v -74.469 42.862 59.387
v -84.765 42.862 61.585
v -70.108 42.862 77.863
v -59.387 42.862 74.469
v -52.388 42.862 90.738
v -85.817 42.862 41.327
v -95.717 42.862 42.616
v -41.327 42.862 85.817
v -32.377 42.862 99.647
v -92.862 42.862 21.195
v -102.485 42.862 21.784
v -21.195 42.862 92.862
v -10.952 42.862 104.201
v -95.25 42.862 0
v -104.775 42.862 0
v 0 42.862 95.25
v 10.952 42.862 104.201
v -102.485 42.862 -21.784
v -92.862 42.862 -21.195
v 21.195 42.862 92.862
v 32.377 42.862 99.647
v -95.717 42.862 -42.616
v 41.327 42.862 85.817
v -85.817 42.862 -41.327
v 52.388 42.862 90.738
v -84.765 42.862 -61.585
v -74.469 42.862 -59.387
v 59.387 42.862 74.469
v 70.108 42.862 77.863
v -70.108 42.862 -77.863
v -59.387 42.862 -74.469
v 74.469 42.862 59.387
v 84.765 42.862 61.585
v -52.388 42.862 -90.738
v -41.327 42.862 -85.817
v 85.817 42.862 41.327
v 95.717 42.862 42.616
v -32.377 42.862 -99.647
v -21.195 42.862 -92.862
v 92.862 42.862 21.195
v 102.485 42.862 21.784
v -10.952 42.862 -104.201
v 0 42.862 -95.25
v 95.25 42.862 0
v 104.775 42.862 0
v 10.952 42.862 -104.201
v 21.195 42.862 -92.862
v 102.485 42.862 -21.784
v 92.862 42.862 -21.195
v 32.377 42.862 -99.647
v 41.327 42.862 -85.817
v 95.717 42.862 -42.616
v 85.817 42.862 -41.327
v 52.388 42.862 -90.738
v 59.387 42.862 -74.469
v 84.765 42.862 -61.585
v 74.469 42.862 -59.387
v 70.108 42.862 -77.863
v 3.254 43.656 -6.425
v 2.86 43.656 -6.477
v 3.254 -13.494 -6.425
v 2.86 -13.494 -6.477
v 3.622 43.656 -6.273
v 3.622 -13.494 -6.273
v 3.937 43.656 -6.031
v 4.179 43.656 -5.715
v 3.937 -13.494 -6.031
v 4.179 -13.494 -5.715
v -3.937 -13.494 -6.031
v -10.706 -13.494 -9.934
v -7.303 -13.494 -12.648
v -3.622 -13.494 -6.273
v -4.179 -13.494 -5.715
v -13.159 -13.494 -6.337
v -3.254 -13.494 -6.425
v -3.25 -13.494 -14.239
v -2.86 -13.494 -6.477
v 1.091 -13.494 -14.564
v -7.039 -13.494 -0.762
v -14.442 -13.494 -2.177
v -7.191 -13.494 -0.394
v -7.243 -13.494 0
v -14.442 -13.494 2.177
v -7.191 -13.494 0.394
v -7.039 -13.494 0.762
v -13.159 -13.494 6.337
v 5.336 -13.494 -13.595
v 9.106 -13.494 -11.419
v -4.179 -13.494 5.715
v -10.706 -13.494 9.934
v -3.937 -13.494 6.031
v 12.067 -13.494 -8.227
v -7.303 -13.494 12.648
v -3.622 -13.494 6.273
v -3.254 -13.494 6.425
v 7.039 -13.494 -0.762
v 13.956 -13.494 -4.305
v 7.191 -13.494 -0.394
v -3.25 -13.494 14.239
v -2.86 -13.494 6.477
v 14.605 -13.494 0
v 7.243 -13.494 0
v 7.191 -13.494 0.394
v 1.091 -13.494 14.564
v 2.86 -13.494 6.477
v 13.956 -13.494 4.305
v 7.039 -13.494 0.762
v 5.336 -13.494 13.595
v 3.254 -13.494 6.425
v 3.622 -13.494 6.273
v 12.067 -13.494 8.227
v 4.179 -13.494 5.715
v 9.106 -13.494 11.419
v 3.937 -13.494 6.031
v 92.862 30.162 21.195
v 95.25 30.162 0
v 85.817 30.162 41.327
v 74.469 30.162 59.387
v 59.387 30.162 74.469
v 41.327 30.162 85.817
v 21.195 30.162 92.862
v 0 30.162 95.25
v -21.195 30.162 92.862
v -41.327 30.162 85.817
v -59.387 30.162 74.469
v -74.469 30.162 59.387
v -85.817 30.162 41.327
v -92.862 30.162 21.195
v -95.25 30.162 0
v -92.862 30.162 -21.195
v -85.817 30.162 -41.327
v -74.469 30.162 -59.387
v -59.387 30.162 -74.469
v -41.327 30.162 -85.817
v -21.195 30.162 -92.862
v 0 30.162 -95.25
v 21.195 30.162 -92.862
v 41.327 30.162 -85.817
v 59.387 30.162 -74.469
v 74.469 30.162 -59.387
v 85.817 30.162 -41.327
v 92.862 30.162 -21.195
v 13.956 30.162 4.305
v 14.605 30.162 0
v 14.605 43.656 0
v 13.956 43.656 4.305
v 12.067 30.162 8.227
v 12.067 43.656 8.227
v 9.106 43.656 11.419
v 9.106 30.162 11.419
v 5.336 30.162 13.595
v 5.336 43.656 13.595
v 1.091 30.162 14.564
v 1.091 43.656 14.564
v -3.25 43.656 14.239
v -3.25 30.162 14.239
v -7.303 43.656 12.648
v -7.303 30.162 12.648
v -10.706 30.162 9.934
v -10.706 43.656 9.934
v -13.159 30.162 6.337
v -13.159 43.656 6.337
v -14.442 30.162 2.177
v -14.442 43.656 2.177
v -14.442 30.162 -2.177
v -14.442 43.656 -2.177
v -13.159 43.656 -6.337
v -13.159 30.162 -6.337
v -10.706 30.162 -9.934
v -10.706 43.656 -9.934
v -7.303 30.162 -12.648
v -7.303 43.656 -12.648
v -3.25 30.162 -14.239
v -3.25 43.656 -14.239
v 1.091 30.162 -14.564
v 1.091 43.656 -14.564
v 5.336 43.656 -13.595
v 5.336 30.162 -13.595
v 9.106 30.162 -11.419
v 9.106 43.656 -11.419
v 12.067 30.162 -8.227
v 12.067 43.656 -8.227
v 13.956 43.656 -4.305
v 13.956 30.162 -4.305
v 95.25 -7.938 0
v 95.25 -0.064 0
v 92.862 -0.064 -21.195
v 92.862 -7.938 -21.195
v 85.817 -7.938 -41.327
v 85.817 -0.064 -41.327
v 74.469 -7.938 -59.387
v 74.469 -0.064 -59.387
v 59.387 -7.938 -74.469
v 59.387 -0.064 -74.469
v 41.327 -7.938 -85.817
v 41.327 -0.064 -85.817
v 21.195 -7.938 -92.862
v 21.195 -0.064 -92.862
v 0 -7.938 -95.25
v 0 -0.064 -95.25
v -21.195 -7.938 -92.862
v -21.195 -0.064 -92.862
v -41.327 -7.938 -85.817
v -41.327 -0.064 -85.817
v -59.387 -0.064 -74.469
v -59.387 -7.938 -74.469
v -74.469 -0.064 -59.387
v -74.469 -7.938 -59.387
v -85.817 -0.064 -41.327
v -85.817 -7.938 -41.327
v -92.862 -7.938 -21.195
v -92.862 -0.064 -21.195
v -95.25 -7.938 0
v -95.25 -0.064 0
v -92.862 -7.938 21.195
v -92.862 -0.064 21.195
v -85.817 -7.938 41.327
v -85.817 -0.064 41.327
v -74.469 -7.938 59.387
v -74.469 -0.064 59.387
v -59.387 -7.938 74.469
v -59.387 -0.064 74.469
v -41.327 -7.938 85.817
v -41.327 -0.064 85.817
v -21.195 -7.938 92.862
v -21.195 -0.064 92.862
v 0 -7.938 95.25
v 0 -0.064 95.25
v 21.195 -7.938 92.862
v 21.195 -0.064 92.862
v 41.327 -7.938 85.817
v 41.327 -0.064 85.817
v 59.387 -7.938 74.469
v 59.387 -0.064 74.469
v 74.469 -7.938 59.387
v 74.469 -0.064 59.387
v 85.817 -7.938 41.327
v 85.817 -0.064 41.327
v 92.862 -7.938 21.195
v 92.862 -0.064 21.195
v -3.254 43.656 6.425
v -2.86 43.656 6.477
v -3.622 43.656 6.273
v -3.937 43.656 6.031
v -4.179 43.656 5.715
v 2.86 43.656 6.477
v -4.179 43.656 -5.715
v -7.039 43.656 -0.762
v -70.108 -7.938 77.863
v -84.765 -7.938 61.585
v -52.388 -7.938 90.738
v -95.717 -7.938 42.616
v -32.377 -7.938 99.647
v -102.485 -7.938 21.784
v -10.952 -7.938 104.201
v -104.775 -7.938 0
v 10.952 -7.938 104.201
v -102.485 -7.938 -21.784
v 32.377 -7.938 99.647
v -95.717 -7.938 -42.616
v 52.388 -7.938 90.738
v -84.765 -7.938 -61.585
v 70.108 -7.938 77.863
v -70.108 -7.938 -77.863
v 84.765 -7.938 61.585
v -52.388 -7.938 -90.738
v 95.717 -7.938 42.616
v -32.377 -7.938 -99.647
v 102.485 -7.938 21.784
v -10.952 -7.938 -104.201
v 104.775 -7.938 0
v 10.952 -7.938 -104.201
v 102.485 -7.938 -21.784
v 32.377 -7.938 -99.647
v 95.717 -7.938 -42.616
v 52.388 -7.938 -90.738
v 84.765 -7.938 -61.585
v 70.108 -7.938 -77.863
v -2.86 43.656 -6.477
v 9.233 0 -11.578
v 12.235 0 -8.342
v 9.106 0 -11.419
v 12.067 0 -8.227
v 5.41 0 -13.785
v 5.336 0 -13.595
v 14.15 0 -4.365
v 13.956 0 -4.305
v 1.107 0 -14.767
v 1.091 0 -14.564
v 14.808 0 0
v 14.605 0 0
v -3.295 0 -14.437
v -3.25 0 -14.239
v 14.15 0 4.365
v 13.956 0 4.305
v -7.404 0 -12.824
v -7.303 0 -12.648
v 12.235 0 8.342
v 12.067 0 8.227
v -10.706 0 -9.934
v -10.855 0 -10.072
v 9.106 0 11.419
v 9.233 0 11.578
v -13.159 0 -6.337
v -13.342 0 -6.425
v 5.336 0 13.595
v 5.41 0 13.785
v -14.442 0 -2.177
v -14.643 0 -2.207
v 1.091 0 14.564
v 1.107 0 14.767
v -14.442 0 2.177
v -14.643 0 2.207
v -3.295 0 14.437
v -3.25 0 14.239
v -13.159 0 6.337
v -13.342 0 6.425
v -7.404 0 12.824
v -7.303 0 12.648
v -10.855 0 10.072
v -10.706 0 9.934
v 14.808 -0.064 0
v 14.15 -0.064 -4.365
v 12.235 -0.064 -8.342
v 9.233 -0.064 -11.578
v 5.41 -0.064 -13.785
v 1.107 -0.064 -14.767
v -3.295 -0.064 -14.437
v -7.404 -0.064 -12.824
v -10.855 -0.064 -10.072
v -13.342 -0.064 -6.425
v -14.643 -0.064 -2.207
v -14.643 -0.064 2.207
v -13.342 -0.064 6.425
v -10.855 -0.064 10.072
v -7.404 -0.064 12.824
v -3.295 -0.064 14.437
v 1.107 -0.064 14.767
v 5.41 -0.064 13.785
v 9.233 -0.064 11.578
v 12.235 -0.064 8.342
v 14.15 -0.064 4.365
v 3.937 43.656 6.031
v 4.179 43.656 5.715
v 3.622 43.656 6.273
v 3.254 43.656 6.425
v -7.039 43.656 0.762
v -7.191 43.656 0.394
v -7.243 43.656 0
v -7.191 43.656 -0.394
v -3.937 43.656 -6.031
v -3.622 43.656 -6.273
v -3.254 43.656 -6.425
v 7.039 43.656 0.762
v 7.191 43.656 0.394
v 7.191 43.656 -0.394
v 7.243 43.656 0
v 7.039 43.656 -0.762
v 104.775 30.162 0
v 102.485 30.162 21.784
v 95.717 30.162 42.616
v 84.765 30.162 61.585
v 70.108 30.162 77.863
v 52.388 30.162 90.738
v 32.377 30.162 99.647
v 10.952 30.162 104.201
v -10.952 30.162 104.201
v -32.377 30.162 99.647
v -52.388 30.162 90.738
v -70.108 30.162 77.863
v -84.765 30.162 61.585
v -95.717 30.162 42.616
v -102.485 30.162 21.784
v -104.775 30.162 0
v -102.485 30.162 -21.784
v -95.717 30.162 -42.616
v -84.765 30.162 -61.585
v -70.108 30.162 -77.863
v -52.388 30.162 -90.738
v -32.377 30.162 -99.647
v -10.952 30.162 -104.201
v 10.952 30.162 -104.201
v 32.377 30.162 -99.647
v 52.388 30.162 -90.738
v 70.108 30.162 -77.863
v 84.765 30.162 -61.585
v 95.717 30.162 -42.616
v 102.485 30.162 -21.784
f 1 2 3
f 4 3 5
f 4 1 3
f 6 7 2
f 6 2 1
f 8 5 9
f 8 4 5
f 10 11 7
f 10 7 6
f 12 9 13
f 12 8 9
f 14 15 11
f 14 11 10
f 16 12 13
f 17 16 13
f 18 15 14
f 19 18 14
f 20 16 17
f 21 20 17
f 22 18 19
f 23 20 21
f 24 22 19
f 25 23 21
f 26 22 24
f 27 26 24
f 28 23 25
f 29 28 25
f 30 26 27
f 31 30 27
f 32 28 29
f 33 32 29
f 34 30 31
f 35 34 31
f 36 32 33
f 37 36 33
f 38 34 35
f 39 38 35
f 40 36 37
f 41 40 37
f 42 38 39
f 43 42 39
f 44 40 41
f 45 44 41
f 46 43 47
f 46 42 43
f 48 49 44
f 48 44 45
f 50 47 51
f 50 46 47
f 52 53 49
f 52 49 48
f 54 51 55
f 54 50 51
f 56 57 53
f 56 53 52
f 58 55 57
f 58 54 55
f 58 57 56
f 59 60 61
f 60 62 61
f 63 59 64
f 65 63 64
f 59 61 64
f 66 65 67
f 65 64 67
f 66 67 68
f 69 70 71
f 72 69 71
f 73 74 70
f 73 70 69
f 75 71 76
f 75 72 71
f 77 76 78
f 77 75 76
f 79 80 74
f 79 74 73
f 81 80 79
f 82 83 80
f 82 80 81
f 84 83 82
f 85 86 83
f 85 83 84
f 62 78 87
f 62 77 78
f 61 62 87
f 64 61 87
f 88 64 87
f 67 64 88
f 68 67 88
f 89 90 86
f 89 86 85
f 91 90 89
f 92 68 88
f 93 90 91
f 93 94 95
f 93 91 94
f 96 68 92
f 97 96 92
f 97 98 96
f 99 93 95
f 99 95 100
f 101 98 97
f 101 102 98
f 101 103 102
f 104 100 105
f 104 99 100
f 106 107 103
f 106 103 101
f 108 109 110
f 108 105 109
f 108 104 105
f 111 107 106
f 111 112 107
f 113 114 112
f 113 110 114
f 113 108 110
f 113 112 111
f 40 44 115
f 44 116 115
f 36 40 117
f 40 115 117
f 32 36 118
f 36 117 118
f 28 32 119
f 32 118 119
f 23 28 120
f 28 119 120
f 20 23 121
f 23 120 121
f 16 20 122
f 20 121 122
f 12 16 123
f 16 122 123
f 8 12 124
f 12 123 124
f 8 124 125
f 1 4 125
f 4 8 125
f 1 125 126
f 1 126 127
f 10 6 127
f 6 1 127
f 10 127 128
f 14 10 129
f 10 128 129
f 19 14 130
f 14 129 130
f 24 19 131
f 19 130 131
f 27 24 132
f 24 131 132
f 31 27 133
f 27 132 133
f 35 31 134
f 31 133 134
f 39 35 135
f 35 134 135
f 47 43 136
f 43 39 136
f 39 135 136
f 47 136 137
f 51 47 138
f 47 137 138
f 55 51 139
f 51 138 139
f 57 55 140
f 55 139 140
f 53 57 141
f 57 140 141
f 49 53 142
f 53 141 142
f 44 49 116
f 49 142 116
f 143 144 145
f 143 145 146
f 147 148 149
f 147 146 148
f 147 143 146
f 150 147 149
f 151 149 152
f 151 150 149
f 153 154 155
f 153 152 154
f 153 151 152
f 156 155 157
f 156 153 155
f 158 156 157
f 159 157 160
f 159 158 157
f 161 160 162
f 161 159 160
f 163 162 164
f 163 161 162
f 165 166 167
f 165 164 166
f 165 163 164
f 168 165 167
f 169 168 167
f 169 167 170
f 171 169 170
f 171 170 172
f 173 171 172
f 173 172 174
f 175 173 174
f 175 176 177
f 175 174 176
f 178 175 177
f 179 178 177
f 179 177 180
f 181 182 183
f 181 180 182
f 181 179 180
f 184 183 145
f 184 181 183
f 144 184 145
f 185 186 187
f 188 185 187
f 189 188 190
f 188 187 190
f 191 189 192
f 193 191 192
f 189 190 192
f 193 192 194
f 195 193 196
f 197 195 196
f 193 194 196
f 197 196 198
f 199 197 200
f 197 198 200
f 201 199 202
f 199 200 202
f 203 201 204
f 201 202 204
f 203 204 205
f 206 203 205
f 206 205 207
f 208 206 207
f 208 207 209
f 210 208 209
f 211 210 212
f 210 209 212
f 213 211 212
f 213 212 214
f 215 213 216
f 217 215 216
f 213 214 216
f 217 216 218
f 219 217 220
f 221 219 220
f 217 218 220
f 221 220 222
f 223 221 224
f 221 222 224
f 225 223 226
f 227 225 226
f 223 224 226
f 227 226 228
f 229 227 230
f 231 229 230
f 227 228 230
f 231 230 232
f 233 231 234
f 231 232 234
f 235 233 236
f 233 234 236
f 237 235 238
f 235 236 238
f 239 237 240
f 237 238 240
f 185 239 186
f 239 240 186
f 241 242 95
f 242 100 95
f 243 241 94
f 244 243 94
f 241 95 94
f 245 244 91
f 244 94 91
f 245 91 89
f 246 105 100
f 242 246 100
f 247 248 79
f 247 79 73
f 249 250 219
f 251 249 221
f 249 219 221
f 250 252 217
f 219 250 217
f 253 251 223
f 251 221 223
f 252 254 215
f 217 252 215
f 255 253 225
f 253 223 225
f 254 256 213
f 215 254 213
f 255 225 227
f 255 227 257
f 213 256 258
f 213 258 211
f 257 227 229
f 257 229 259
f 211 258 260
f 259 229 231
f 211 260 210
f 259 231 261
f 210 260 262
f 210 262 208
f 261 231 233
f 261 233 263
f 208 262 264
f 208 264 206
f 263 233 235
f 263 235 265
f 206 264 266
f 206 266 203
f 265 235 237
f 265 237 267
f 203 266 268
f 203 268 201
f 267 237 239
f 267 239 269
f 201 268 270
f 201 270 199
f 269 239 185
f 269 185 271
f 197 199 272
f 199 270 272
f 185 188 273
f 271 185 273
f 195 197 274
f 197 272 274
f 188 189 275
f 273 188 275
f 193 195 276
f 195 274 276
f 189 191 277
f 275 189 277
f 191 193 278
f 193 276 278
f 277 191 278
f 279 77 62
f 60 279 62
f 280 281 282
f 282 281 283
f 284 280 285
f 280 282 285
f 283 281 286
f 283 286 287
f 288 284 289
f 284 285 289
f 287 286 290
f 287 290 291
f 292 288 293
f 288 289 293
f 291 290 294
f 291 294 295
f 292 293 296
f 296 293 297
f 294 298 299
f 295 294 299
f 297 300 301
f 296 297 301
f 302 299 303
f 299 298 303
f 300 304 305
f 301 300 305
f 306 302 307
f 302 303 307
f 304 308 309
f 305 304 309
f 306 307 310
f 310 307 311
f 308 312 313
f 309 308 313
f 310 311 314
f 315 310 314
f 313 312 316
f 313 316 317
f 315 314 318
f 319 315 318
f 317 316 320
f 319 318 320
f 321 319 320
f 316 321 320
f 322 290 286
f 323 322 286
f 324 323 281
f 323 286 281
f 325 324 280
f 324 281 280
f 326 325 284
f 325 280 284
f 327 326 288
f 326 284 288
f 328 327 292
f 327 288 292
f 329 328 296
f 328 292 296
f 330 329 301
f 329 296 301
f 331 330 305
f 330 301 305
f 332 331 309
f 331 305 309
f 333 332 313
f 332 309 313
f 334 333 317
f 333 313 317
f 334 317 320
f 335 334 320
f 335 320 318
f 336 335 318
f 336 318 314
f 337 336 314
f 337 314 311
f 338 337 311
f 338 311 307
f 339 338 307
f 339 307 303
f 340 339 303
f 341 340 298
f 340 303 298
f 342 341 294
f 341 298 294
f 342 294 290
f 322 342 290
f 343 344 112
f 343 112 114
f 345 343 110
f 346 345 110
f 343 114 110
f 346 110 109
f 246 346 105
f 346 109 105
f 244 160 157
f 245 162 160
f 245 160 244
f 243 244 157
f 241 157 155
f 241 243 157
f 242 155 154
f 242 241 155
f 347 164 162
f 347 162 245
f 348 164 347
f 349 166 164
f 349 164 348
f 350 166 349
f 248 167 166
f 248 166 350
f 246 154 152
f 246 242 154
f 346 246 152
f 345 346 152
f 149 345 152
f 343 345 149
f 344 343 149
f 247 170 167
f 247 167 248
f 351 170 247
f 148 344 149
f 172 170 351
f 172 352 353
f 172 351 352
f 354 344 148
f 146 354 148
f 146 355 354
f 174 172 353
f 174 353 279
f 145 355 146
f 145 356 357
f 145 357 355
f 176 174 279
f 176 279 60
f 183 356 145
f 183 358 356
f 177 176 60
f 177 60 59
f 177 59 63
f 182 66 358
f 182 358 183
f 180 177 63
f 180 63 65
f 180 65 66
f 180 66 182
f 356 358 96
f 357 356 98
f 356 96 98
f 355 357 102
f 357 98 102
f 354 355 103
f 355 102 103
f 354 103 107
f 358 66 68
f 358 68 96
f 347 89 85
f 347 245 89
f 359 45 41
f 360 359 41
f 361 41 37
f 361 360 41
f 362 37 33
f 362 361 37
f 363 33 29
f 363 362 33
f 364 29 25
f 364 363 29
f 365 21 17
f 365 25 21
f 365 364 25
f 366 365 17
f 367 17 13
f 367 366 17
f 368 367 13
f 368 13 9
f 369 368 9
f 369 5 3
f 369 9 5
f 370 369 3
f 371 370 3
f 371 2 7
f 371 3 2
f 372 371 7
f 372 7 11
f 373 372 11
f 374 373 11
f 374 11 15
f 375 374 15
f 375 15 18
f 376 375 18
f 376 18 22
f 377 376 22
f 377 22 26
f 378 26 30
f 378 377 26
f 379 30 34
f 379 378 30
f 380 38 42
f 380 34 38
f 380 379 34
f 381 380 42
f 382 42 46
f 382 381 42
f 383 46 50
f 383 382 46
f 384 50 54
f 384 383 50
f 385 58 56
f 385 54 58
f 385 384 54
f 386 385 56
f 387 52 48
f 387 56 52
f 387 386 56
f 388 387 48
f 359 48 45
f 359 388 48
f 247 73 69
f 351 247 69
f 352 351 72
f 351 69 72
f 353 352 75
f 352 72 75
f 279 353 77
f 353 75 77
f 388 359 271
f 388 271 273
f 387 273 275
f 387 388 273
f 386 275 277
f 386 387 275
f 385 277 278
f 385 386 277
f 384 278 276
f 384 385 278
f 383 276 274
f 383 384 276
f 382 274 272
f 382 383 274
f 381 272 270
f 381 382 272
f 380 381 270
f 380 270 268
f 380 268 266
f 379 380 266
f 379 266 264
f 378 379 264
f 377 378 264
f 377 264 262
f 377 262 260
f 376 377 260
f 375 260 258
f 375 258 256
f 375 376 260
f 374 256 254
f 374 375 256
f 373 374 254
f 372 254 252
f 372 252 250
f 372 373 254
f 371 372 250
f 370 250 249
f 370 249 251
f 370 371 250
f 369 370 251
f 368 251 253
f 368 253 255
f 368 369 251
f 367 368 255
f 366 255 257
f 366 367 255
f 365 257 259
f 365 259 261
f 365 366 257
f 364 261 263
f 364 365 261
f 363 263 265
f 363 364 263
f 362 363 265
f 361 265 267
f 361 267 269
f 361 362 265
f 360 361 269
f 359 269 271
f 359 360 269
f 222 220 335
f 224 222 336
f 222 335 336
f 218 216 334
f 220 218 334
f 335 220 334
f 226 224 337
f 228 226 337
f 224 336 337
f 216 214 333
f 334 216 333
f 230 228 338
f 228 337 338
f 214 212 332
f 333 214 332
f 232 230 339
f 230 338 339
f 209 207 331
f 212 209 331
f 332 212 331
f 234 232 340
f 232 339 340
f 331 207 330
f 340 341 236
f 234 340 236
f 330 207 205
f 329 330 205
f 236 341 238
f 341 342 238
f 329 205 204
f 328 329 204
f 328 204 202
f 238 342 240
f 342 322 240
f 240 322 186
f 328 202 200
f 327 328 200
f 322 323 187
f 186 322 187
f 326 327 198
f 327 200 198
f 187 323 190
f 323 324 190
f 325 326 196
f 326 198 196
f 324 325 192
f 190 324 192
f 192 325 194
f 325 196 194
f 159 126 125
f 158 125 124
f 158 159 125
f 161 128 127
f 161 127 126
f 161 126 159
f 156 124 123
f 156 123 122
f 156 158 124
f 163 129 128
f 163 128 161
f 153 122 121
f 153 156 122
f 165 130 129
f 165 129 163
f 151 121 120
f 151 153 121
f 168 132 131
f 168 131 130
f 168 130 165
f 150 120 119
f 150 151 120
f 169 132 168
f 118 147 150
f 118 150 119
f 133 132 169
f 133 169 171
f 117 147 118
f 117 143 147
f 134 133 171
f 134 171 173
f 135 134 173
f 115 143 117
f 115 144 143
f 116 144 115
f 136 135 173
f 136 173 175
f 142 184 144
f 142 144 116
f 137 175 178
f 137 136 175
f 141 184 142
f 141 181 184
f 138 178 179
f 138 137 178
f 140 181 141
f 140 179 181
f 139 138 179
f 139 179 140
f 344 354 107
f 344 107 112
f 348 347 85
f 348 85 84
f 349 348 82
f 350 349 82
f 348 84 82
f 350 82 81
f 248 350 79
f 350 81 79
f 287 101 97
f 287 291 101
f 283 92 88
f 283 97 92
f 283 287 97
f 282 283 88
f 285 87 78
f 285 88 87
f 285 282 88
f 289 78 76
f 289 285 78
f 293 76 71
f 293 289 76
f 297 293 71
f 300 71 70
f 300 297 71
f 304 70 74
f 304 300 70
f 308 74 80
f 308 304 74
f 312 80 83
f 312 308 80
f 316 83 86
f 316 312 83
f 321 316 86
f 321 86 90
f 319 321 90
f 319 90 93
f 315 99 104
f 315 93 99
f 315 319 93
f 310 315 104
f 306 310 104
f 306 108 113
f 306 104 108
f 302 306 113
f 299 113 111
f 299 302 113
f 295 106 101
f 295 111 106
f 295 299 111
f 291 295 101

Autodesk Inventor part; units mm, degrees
ref_plane "YZ Plane" through (0, 0, 0) normal (1, 0, 0) x (0, 1, 0)
ref_plane "XZ Plane" through (0, 0, 0) normal (0, 1, 0) x (-1, 0, 0)
ref_plane "XY Plane" through (0, 0, 0) normal (0, 0, 1) x (1, 0, 0)
sketch "Sketch1" plane through (0, 0, 0) normal (0, 1, 0) x (-1, 0, 0)
  line L0 (18.3309, -0.0019) -> (9.1638, -15.8759)
  line L1 (9.1638, -15.8759) -> (-9.1671, -15.8741)
  line L2 (-9.1671, -15.8741) -> (-18.3309, 0.0019)
  line L3 (-18.3309, 0.0019) -> (-9.1638, 15.8759)
  line L4 (-9.1638, 15.8759) -> (9.1671, 15.8741)
  line L5 (9.1671, 15.8741) -> (18.3309, -0.0019)
  point P0 (0, 0)
  dimension "d2" = 31.75
extrude "Extrusion1" add sketch "Sketch1" along normal blind 30.1625
sketch "Sketch2" plane through (0, 30.1625, 0) normal (0, 1, 0) x (1, 0, 0)
  circle A0 centre (0, 0) radius 14.605
  dimension "d5" = 29.21
extrude "Extrusion2" add sketch "Sketch2" along normal blind 13.4938
sketch "Sketch3" plane through (0, 0, 0) normal (0, -1, 0) x (1, 0, 0)
  circle A0 centre (0, 0) radius 14.605
  dimension "d8" = 29.21
extrude "Extrusion3" add sketch "Sketch3" along normal blind 13.4938
sketch "Sketch4" plane through (0, 43.6562, 0) normal (0, 1, 0) x (1, 0, 0)
  line L0 (-7.479, 0) -> (-3.7395, 6.477)
  line L1 (-3.7395, 6.477) -> (3.7395, 6.477)
  line L2 (3.7395, 6.477) -> (7.479, 0)
  line L3 (7.479, 0) -> (3.7395, -6.477)
  line L4 (3.7395, -6.477) -> (-3.7395, -6.477)
  line L5 (-3.7395, -6.477) -> (-7.479, 0)
  point P0 (0, 0)
  point P1 (0, 0)
  dimension "d11" = 12.954
extrude "Extrusion4" cut sketch "Sketch4" against normal through all
fillet "Fillet1" radius 1.524 6 edges at (7.479, 15.0813, 0) (3.7395, 15.0813, -6.477) (-7.479, 15.0813, 0) (-3.7395, 15.0813, -6.477) (-3.7395, 15.0813, 6.477) (3.7395, 15.0813, 6.477)
sketch "Sketch5" plane through (0, 30.1625, 0) normal (0, 1, 0) x (1, 0, 0)
  circle A0 centre (0, 0) radius 14.8083
  circle A1 centre (0, 0) radius 95.25
  dimension "d15" = 190.5
extrude "Extrusion5" add sketch "Sketch5" against normal blind 30.226
sketch "Sketch6" plane through (0, 30.1625, 0) normal (0, 1, 0) x (1, 0, 0)
  circle A0 centre (0, 0) radius 95.25
  circle A1 centre (0, 0) radius 104.775
  dimension "d18" = 209.55
extrude "Extrusion6" add sketch "Sketch6" along normal blind 12.7 and the other way blind 38.1
properties part number "Wheel Hub" material "Acetal Resin, Black"
